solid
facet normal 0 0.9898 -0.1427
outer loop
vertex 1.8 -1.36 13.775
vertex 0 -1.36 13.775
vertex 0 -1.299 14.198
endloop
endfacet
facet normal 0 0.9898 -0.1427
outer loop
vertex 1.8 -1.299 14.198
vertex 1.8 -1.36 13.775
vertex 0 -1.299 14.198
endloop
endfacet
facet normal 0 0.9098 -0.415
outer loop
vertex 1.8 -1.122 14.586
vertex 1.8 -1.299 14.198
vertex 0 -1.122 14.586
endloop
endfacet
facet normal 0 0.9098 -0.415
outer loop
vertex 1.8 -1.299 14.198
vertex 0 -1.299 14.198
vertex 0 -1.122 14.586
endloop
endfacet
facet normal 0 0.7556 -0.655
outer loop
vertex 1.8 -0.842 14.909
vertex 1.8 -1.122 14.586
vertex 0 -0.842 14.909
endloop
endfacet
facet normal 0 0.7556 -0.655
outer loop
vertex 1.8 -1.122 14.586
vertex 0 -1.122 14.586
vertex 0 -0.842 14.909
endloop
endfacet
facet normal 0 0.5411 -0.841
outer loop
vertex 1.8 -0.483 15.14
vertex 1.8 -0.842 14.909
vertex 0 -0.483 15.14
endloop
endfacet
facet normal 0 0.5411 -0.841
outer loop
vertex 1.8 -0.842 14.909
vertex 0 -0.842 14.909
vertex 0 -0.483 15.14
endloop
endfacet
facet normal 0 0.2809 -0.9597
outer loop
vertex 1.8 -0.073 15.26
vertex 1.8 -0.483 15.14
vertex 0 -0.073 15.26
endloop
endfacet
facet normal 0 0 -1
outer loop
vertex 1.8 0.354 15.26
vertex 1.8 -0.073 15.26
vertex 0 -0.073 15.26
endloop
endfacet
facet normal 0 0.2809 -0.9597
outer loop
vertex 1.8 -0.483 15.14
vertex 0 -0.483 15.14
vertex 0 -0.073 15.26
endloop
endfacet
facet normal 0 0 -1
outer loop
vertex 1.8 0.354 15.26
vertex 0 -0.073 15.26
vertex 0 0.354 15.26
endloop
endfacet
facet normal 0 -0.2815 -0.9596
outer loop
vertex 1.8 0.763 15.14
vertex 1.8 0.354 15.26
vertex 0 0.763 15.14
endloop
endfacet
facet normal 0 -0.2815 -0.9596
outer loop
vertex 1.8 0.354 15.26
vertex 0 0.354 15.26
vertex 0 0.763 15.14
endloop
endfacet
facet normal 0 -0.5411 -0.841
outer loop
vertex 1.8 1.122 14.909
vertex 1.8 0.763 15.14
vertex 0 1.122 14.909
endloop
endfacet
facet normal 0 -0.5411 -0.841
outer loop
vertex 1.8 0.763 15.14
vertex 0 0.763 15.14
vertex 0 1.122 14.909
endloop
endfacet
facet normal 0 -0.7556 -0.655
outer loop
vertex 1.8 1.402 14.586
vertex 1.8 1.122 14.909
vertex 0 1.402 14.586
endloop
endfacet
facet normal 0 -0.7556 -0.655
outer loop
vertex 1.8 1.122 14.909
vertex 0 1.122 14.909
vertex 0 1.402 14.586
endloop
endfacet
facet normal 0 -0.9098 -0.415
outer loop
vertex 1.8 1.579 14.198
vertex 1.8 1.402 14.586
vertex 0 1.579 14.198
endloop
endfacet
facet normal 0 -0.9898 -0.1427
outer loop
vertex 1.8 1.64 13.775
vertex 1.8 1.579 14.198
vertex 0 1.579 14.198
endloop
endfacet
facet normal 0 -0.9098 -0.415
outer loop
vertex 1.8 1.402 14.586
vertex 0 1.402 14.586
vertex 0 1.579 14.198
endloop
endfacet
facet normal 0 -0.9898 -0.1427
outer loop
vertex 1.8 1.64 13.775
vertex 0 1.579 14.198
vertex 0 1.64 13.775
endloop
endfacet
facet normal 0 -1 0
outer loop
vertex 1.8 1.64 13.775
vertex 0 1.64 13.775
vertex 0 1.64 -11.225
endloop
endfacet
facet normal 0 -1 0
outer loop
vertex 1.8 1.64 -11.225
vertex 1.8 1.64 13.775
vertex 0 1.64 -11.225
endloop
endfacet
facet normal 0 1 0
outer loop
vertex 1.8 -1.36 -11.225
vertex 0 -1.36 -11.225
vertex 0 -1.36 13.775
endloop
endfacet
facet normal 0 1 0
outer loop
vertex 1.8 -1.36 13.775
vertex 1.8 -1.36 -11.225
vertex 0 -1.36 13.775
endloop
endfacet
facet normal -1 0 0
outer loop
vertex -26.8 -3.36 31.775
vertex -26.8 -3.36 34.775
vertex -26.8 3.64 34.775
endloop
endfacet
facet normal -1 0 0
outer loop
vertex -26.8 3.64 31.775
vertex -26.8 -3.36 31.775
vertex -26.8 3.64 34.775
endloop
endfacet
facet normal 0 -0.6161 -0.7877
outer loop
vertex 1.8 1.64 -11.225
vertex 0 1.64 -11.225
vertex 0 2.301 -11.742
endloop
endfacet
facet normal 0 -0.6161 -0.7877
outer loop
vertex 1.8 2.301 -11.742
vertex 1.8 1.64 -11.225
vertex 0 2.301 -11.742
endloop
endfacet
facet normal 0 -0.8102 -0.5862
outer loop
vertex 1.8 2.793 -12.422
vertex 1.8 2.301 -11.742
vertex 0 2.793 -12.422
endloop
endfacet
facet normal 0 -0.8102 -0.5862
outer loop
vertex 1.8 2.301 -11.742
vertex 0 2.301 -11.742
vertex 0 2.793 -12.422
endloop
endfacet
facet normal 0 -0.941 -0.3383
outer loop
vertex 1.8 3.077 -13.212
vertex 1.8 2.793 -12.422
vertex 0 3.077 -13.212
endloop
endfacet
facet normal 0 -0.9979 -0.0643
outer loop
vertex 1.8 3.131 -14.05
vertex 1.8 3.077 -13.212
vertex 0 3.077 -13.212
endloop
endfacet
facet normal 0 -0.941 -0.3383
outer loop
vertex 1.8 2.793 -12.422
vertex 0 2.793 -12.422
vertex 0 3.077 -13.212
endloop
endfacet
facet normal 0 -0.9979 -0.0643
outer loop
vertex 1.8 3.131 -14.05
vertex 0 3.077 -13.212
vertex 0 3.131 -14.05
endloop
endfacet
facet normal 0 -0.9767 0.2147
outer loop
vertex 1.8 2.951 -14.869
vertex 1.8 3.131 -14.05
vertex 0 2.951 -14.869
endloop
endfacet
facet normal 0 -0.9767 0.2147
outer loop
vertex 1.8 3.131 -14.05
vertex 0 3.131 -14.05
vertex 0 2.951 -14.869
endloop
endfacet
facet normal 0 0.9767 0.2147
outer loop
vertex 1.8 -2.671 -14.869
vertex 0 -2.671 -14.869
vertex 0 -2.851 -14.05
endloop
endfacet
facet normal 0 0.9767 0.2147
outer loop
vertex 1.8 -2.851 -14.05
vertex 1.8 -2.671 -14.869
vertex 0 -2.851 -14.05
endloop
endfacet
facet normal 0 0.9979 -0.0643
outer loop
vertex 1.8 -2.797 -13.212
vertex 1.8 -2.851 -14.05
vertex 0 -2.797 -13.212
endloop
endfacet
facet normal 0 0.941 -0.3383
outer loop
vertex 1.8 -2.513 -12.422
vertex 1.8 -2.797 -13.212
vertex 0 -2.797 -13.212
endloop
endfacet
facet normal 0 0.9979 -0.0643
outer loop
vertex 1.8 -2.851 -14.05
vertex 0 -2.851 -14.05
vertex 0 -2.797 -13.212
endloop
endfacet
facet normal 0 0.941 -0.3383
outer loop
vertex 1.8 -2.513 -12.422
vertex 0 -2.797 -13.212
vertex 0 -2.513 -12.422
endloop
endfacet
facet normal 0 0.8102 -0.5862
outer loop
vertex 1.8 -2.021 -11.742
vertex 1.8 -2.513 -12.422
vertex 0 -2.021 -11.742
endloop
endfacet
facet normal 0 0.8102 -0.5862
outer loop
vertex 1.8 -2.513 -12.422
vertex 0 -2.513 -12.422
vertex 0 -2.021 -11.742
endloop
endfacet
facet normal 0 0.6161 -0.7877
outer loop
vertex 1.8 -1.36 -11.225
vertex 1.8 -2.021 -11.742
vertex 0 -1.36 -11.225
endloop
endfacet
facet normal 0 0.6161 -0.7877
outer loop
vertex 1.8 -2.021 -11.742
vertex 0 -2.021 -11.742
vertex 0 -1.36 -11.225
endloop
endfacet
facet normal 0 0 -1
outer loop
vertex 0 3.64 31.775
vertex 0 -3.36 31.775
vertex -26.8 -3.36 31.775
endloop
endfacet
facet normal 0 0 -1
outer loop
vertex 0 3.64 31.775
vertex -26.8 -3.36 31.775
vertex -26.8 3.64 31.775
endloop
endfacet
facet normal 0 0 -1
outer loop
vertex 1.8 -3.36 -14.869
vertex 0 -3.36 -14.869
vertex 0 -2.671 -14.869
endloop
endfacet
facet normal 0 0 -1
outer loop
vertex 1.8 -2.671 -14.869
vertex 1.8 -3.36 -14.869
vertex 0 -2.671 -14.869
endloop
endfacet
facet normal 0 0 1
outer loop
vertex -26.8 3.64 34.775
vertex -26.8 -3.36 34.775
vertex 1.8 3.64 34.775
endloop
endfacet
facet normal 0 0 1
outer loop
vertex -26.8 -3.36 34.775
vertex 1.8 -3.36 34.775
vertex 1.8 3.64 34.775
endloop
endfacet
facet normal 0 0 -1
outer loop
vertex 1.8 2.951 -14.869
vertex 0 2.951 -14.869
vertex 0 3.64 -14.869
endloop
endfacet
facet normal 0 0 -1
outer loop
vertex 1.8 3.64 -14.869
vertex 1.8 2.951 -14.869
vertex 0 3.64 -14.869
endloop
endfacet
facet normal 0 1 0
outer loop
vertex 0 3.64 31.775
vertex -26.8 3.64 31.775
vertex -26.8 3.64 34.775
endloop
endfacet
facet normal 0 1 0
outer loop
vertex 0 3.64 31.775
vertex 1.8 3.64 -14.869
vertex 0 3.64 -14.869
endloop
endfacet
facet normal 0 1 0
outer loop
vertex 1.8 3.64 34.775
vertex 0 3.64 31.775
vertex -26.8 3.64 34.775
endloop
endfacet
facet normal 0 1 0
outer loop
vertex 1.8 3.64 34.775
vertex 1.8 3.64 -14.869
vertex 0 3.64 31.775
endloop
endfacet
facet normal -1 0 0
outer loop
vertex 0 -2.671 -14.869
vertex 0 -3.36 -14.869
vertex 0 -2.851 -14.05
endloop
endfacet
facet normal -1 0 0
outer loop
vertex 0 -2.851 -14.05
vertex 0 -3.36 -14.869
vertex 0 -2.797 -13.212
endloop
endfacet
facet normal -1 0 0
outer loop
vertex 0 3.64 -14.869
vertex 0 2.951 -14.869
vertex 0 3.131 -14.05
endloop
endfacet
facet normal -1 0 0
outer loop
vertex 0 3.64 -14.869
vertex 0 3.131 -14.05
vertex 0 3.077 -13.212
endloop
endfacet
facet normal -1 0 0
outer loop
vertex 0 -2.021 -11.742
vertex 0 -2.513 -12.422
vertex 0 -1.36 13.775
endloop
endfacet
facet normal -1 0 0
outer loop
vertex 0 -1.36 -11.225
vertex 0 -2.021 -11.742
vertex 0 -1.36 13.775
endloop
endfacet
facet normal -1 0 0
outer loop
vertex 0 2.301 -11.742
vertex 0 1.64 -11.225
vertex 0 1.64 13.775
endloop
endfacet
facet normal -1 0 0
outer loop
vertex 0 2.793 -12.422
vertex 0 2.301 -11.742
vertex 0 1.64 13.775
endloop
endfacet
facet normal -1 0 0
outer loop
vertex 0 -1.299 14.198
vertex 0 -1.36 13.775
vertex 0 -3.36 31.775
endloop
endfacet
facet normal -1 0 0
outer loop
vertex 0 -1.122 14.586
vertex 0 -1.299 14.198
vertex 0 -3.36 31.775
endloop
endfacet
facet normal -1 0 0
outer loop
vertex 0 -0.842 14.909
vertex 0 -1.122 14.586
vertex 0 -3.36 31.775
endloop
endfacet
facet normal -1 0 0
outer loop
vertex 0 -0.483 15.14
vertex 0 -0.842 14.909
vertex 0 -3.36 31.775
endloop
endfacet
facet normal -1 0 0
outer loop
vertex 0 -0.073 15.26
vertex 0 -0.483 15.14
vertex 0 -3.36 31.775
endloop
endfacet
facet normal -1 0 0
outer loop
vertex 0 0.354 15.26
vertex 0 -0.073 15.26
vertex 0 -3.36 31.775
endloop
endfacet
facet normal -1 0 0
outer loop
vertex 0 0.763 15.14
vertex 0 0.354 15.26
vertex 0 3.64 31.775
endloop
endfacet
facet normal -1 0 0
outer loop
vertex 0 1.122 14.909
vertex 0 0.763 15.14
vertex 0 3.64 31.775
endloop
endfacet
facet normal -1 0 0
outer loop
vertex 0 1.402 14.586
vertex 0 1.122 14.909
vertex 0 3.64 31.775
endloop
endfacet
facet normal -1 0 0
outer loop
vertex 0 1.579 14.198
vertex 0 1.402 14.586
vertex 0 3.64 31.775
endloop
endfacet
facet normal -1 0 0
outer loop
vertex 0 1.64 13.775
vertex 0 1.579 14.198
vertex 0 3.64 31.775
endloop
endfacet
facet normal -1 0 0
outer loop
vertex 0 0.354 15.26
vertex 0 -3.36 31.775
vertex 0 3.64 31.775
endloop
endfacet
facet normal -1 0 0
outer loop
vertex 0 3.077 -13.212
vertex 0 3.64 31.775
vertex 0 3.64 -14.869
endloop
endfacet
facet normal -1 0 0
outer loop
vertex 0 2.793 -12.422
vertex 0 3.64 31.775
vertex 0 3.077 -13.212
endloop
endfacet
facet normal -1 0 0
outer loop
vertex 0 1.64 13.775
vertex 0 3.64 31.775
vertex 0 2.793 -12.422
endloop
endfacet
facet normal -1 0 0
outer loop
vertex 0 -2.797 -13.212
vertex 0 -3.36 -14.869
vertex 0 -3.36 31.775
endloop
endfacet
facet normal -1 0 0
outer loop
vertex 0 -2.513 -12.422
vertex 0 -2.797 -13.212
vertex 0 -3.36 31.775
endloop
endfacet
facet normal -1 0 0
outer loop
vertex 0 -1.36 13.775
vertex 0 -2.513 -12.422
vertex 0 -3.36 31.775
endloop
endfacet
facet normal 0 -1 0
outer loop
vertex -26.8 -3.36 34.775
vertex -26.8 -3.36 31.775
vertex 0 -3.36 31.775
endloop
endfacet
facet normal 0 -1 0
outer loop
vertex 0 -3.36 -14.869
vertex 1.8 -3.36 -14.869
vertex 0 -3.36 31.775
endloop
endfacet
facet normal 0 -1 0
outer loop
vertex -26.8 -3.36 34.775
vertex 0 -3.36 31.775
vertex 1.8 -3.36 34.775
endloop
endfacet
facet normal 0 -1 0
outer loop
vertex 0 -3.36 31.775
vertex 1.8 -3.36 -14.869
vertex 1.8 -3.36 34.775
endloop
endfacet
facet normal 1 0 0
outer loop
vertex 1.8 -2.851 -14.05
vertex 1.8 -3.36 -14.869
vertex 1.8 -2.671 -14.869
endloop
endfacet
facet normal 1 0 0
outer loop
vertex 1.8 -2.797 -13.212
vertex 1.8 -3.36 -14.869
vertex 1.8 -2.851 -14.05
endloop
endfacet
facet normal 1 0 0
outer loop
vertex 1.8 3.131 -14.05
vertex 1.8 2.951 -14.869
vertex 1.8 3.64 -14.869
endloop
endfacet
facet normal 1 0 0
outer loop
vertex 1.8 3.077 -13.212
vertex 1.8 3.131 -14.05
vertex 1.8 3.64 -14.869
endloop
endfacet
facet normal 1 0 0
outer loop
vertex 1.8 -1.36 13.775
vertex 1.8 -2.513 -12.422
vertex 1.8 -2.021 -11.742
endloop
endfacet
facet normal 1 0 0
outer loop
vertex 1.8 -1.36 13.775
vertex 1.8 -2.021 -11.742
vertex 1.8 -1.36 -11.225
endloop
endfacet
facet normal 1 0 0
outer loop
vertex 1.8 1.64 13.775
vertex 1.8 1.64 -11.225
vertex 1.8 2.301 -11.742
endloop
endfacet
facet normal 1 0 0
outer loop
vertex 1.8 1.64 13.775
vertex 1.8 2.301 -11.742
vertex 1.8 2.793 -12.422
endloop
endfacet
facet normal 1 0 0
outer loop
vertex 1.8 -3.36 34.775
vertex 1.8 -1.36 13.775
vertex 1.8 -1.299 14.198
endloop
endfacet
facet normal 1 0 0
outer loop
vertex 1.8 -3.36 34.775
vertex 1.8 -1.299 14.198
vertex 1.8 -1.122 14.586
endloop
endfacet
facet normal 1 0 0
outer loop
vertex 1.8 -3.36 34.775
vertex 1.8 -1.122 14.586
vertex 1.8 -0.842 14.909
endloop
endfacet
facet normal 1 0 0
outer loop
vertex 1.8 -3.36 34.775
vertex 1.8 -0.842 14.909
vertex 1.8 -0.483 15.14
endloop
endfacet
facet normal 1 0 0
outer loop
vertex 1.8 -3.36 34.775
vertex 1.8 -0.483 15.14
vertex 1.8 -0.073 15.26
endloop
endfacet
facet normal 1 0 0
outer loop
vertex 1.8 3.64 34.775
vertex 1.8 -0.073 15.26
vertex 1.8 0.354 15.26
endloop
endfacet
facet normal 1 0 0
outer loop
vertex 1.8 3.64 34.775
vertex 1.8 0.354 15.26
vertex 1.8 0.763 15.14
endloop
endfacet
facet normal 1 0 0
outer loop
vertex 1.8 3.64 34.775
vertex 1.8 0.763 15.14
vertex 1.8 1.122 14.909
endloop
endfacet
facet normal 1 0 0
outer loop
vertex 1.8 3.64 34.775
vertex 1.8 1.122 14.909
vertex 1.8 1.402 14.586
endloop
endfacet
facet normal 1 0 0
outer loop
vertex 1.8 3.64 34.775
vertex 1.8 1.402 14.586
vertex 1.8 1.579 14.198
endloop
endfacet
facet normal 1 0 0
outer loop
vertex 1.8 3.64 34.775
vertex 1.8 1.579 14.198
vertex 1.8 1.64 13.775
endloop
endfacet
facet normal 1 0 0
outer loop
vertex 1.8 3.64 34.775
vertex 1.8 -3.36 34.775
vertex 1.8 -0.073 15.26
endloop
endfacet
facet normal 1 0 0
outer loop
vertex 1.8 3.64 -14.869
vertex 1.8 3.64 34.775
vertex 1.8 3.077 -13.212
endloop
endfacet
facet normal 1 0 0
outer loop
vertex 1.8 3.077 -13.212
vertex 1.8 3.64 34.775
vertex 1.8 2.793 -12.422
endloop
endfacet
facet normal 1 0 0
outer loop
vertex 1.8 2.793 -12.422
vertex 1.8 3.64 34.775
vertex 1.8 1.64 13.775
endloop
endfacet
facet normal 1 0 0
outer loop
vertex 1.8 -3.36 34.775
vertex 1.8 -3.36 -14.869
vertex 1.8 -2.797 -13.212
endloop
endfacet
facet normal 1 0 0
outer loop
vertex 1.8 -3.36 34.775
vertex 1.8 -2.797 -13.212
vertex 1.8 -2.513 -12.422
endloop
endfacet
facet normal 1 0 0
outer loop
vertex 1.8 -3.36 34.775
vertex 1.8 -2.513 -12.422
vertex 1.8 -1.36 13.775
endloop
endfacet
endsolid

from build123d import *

# Parameters (mm, degrees)
F2_DEPTH = 1.8
F3_W     = 7
F3_H     = 3
F4_DEPTH = 26.8


with BuildPart() as f2:
    # F0 (on Right) → F2 (new body)
    with BuildSketch(Plane.YZ):
        with BuildLine():
            Line((-1.35995, -11.224572), (-1.35995, 13.775428))
            ThreePointArc((-1.35995, 13.775428), (0.14005, 15.275428), (1.64005, 13.775428))
            Line((1.64005, 13.775428), (1.64005, -11.224572))
            ThreePointArc((1.64005, -11.224572), (2.962893, -12.806991), (2.951484, -14.869473))
            Line((2.951484, -14.869473), (3.64005, -14.869473))
            Line((3.64005, -14.869473), (3.64005, 34.775428))
            Line((3.64005, 34.775428), (-3.35995, 34.775428))
            Line((-3.35995, 34.775428), (-3.35995, -14.869473))
            Line((-3.35995, -14.869473), (-2.671383, -14.869473))
            ThreePointArc((-2.671383, -14.869473), (-2.682792, -12.806991), (-1.35995, -11.224572))
        make_face()
    extrude(amount=F2_DEPTH)

    # F3 (on face) → F4 (join)
    with BuildSketch(Plane.YZ):
        with Locations((0.14005, 33.275428)):
            Rectangle(F3_W, F3_H)
    extrude(amount=-F4_DEPTH)


solid = f2.part
